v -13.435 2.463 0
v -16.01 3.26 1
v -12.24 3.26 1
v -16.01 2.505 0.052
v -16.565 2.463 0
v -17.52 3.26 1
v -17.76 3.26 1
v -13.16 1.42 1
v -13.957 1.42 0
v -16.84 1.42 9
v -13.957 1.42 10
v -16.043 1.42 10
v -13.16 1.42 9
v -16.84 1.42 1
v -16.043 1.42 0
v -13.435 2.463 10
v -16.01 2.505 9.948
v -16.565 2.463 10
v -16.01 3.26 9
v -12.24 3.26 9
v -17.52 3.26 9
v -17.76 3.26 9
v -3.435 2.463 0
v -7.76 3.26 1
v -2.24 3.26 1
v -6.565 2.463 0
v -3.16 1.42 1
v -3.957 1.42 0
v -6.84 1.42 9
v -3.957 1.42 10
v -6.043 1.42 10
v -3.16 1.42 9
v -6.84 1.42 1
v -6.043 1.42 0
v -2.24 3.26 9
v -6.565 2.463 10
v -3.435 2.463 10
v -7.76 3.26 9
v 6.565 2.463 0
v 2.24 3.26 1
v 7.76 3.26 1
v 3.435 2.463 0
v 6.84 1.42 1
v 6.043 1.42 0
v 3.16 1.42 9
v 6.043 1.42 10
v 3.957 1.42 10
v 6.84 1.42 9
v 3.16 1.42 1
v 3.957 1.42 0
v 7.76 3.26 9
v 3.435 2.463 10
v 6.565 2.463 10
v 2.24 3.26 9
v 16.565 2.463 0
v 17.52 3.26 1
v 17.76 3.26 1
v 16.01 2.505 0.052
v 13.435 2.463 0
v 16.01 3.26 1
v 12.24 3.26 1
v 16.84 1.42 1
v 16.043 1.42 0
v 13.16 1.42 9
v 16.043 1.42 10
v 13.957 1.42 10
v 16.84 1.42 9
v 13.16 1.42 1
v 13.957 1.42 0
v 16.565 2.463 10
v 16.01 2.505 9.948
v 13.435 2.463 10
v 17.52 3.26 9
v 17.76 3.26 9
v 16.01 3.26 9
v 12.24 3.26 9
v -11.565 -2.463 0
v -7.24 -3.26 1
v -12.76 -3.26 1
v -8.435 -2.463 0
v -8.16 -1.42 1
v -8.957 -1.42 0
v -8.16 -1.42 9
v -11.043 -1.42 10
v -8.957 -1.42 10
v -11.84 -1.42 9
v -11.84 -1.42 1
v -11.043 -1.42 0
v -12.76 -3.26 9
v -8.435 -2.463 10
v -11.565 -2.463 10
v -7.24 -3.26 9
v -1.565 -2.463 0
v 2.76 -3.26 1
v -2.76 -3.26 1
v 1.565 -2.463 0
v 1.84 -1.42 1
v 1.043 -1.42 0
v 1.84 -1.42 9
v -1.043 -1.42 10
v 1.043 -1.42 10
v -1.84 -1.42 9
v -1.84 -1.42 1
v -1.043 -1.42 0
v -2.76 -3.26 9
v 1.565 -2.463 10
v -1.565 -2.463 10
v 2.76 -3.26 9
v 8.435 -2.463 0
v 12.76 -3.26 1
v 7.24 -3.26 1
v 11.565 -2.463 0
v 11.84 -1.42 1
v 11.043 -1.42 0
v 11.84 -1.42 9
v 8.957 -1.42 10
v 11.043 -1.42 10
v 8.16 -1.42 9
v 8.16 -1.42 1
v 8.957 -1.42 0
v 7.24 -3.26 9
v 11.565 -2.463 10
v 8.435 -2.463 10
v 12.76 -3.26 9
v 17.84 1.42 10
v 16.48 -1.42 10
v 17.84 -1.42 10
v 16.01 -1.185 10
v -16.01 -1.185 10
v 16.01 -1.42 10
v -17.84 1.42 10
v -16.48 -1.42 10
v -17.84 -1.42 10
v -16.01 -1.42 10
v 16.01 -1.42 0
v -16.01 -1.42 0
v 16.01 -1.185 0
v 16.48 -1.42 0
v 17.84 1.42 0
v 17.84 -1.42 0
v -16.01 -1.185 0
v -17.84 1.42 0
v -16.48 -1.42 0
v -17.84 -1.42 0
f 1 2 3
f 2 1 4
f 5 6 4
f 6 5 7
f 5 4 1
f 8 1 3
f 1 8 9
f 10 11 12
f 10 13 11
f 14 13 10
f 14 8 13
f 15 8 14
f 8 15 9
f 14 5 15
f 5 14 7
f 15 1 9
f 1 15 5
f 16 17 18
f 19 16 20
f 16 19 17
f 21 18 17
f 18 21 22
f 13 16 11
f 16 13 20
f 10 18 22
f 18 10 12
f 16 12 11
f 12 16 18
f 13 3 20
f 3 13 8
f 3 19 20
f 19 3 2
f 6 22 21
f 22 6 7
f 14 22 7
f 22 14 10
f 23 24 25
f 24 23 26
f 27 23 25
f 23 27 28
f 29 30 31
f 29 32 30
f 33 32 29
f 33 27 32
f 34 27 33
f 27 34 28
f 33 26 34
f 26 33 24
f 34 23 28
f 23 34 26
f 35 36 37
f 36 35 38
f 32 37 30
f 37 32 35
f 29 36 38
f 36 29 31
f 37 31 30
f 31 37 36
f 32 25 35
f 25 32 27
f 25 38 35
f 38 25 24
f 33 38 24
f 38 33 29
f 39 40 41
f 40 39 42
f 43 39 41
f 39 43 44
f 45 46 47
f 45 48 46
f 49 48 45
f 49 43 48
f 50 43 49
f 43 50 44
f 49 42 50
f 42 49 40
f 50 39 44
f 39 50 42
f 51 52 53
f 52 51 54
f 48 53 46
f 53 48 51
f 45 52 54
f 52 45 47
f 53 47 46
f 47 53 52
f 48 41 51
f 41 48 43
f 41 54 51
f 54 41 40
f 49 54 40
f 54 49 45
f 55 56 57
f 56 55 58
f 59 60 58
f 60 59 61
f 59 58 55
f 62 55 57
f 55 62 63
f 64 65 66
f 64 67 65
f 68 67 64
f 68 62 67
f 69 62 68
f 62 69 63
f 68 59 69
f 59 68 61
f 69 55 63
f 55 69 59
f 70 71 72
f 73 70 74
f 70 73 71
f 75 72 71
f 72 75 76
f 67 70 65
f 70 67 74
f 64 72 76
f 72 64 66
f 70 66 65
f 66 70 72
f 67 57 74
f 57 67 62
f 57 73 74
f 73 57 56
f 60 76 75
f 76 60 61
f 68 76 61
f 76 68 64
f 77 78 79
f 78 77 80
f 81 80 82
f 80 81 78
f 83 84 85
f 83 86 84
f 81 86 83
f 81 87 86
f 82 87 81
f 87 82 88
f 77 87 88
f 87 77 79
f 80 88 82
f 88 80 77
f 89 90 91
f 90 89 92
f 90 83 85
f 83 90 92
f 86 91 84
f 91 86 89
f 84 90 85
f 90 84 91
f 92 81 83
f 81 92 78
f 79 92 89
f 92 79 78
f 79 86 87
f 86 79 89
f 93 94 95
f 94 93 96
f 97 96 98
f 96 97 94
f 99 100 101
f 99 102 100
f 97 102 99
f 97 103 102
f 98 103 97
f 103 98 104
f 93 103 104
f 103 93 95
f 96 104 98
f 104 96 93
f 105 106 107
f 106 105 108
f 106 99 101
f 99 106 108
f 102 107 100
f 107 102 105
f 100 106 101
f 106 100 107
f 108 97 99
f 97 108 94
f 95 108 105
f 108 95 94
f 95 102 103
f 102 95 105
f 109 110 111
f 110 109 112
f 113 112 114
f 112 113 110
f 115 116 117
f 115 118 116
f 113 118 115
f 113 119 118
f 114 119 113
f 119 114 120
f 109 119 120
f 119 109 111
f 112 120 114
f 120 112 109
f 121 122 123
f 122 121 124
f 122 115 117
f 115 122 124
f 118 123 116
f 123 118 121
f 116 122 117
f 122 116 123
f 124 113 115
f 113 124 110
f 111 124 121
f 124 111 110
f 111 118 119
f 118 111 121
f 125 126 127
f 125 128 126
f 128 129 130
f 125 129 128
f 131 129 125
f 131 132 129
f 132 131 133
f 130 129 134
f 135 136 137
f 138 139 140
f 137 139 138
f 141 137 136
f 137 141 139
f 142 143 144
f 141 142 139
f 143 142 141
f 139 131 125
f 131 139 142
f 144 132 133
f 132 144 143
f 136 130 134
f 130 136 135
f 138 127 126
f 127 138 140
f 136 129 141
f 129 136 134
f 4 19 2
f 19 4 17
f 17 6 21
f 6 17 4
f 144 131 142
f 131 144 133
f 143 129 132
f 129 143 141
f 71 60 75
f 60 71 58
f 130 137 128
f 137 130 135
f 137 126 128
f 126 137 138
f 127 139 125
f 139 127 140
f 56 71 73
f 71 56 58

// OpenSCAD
// am_dovetail.scad
// a library providing dovetail interconnections
//
//
// Background:
//   - CAD manual: http://www.openscad.org/documentation.html
//   - possibility to attach to parts from raspi_RJ45fix.scad
//
// Andreas Merz 2020-01-04, v0.2 
// GPLv3 or later, see http://www.gnu.org/licenses





//-------------------------------
// dovetail
//
//       w2
//    ---------
//    \       /  h
//     ---+---
//       w1
//-------------------------------

// Main dimensions
dt_w1=4;              // nominal size
dt_w2=6;
dt_h=2; 
dt_grid=dt_w1+dt_w2;  // 10 mm
dt_c=0.16;            // clearance / spiel in mm

dt_angle_deg=atan((dt_w2-dt_w1)/dt_w1);

// -------------------------------------------------------
// 2D shapes
// -------------------------------------------------------

module dt_shapeNominal(h=dt_h, w1=dt_w1, w2=dt_w2, c=0) {
             hh=h-c;
	     y1=w1/2-c;
	     y2=y1+(w2-w1)/2*hh/h;   // keep slope angle, even if c is not 0;
             polygon(points=[[-y1,0],[y1,0],[y2,hh],[-y2,hh]]);
}

module dt_shapeMajor() {
  dt_shapeNominal(c=-dt_c);
}

module dt_shapeMinor() {
  dt_shapeNominal(c=dt_c);
}


// -------------------------------------------------------
// 3D shapes
// -------------------------------------------------------

// legacy module

module dovetail3D(h=20, s=45, t=0.8) {
         c=0.3;   // clearance / spiel in mm
         difference() { 
           linear_extrude(height=h)
              union() {
                dt_shapeMinor();
                translate([-dt_h+c,-t]) square([dt_w1-2*c,t]);

              }
           rotate([s,0,0]) translate([-4,0,-4]) cube([8, 4, 4]);
         }
 }


// And cap - may be used to handle broadening at the printer bed

module am_dovetailCap(t=1.0, c=dt_c) {
      scl = (c < 0) ? 2 : 0;               // for negative clearances we create the dovetailSub case
      translate([0,0,0]) mirror([0,0,1])
      difference() {
	linear_extrude(height=dt_h/cos(30), scale=scl)
	  dt_shapeNominal(c=c);
	translate([-3*dt_w1,-3*dt_w2,t]) 
	  cube([6*dt_w1,6*dt_w2, dt_h/cos(30)+1]);
      }
}



// Dovetail to be attached to another body

module am_dovetailAdd(h=10, t=1.2, sgn=1) {
    //h:    overall height
    //t:    transition region
    //sub:  flag to handle the subtract case
    c = sgn*dt_c;
    union () {
      translate([0,0,t])
        am_dovetailCap(t=t, c=c);
      translate([0,0,t])
	linear_extrude(height=h-2*t, scale=1)
	  dt_shapeNominal(c=c);
      translate([0,0,h-t]) mirror([0,0,1])
        am_dovetailCap(t=t, c=c);
    }
}


// Dovetail to be carved out of another body

module am_dovetailSub(h=10, t=1.0) {
    //h:    overall height
    //t:    transition region
    //sub:  flag to handle the subtract case
    am_dovetailAdd(h=h, t=t, sgn=-1);
}


// negative dovetail to sculpt on another

module am_dovetailNeg(h=100, xo=dt_grid, yo=2*dt_h) {
    //h:    overall height
    //xo:   outer x
    //yo:   outer y
    difference() {
      translate([0, dt_h+0.01, h/2]) cube([xo, yo, h-0.02], center=true);
      linear_extrude(height=h, scale=1)	dt_shapeNominal(c=dt_c);
    }
}


// Multiple dovetails

module am_dovetailAddN(h=10, t=1.0, n=6, sgn=1) {
  m=n/2+0.5;
  for (i=[1:n]) {
    translate([dt_grid*(i-m),0,0]) am_dovetailAdd(h=h, t=t, sgn=sgn); 
  }
}

module am_dovetailPlateA(h=10, n=6, d=3) {
  y=(d-dt_c)/2;
  dw=(dt_w2-dt_w1)/2;
  union() {
    translate([0, y, 0])  am_dovetailAddN(h=h,n=n);
    translate([0,0,h/2]) cube([(n-0.5)*dt_grid-dw-dt_c, 2*y, h], center=true);
    translate([0,-y, 0])  mirror([0,1,0]) am_dovetailAddN(h=h,n=(n-1));
  }
}

module am_dovetailPlateB(h=10, n=6, d=3) {
  y=(d-dt_c)/2;
  dw=(dt_w2-dt_w1)/2;
  difference() {
    union() {
      translate([0,y,0]) am_dovetailAddN(h=h,n=n);
      translate([0,0,h/2]) cube([(n-0.5)*dt_grid+dw-dt_c, 2*y, h], center=true);
      translate([0,-y,0]) mirror([0,1,0]) am_dovetailAddN(h=h,n=(n-1));
    }
    union() {
      translate([-(n-1)*dt_grid/2-dw, d/2+dt_h+dt_c-dt_w2/2, -0.1]) rotate([0, 0, 90]) am_dovetailNeg(h=h+0.2);
      translate([+(n-1)*dt_grid/2+dw, d/2+dt_h+dt_c-dt_w2/2, -0.1]) rotate([0, 0,-90]) am_dovetailNeg(h=h+0.2);
    }
  }
}

//------------- Instances --------------------

// module testing

// test 2D shapes
//translate([dt_grid/2+0.2, dt_h, 0]) mirror([0,1,0]) dt_shapeNominal(c=-dt_c);   dt_shapeNominal(c=dt_c);
//translate([0, 0, 1.1]) mirror([0,0,0]) dt_shapeNominal(c=-dt_c);  color("red") dt_shapeNominal(c=dt_c);

// test 3D shapes
//mirror([0,0,1]) am_dovetailCap(c=+0.01);  translate([0,0,0])  am_dovetailCap(c=-0.01);
//am_dovetailAdd(h=5,t=0.1);  translate([dt_grid/2+0.2, dt_h+dt_c, 0]) mirror([0,1,0]) am_dovetailSub(h=5,t=0.1);

//dovetail3D();

//am_dovetailAdd();

//am_dovetailAddN();

//am_dovetailPlateA();

//am_dovetailNeg(h=10);


am_dovetailPlateB(n=4);
